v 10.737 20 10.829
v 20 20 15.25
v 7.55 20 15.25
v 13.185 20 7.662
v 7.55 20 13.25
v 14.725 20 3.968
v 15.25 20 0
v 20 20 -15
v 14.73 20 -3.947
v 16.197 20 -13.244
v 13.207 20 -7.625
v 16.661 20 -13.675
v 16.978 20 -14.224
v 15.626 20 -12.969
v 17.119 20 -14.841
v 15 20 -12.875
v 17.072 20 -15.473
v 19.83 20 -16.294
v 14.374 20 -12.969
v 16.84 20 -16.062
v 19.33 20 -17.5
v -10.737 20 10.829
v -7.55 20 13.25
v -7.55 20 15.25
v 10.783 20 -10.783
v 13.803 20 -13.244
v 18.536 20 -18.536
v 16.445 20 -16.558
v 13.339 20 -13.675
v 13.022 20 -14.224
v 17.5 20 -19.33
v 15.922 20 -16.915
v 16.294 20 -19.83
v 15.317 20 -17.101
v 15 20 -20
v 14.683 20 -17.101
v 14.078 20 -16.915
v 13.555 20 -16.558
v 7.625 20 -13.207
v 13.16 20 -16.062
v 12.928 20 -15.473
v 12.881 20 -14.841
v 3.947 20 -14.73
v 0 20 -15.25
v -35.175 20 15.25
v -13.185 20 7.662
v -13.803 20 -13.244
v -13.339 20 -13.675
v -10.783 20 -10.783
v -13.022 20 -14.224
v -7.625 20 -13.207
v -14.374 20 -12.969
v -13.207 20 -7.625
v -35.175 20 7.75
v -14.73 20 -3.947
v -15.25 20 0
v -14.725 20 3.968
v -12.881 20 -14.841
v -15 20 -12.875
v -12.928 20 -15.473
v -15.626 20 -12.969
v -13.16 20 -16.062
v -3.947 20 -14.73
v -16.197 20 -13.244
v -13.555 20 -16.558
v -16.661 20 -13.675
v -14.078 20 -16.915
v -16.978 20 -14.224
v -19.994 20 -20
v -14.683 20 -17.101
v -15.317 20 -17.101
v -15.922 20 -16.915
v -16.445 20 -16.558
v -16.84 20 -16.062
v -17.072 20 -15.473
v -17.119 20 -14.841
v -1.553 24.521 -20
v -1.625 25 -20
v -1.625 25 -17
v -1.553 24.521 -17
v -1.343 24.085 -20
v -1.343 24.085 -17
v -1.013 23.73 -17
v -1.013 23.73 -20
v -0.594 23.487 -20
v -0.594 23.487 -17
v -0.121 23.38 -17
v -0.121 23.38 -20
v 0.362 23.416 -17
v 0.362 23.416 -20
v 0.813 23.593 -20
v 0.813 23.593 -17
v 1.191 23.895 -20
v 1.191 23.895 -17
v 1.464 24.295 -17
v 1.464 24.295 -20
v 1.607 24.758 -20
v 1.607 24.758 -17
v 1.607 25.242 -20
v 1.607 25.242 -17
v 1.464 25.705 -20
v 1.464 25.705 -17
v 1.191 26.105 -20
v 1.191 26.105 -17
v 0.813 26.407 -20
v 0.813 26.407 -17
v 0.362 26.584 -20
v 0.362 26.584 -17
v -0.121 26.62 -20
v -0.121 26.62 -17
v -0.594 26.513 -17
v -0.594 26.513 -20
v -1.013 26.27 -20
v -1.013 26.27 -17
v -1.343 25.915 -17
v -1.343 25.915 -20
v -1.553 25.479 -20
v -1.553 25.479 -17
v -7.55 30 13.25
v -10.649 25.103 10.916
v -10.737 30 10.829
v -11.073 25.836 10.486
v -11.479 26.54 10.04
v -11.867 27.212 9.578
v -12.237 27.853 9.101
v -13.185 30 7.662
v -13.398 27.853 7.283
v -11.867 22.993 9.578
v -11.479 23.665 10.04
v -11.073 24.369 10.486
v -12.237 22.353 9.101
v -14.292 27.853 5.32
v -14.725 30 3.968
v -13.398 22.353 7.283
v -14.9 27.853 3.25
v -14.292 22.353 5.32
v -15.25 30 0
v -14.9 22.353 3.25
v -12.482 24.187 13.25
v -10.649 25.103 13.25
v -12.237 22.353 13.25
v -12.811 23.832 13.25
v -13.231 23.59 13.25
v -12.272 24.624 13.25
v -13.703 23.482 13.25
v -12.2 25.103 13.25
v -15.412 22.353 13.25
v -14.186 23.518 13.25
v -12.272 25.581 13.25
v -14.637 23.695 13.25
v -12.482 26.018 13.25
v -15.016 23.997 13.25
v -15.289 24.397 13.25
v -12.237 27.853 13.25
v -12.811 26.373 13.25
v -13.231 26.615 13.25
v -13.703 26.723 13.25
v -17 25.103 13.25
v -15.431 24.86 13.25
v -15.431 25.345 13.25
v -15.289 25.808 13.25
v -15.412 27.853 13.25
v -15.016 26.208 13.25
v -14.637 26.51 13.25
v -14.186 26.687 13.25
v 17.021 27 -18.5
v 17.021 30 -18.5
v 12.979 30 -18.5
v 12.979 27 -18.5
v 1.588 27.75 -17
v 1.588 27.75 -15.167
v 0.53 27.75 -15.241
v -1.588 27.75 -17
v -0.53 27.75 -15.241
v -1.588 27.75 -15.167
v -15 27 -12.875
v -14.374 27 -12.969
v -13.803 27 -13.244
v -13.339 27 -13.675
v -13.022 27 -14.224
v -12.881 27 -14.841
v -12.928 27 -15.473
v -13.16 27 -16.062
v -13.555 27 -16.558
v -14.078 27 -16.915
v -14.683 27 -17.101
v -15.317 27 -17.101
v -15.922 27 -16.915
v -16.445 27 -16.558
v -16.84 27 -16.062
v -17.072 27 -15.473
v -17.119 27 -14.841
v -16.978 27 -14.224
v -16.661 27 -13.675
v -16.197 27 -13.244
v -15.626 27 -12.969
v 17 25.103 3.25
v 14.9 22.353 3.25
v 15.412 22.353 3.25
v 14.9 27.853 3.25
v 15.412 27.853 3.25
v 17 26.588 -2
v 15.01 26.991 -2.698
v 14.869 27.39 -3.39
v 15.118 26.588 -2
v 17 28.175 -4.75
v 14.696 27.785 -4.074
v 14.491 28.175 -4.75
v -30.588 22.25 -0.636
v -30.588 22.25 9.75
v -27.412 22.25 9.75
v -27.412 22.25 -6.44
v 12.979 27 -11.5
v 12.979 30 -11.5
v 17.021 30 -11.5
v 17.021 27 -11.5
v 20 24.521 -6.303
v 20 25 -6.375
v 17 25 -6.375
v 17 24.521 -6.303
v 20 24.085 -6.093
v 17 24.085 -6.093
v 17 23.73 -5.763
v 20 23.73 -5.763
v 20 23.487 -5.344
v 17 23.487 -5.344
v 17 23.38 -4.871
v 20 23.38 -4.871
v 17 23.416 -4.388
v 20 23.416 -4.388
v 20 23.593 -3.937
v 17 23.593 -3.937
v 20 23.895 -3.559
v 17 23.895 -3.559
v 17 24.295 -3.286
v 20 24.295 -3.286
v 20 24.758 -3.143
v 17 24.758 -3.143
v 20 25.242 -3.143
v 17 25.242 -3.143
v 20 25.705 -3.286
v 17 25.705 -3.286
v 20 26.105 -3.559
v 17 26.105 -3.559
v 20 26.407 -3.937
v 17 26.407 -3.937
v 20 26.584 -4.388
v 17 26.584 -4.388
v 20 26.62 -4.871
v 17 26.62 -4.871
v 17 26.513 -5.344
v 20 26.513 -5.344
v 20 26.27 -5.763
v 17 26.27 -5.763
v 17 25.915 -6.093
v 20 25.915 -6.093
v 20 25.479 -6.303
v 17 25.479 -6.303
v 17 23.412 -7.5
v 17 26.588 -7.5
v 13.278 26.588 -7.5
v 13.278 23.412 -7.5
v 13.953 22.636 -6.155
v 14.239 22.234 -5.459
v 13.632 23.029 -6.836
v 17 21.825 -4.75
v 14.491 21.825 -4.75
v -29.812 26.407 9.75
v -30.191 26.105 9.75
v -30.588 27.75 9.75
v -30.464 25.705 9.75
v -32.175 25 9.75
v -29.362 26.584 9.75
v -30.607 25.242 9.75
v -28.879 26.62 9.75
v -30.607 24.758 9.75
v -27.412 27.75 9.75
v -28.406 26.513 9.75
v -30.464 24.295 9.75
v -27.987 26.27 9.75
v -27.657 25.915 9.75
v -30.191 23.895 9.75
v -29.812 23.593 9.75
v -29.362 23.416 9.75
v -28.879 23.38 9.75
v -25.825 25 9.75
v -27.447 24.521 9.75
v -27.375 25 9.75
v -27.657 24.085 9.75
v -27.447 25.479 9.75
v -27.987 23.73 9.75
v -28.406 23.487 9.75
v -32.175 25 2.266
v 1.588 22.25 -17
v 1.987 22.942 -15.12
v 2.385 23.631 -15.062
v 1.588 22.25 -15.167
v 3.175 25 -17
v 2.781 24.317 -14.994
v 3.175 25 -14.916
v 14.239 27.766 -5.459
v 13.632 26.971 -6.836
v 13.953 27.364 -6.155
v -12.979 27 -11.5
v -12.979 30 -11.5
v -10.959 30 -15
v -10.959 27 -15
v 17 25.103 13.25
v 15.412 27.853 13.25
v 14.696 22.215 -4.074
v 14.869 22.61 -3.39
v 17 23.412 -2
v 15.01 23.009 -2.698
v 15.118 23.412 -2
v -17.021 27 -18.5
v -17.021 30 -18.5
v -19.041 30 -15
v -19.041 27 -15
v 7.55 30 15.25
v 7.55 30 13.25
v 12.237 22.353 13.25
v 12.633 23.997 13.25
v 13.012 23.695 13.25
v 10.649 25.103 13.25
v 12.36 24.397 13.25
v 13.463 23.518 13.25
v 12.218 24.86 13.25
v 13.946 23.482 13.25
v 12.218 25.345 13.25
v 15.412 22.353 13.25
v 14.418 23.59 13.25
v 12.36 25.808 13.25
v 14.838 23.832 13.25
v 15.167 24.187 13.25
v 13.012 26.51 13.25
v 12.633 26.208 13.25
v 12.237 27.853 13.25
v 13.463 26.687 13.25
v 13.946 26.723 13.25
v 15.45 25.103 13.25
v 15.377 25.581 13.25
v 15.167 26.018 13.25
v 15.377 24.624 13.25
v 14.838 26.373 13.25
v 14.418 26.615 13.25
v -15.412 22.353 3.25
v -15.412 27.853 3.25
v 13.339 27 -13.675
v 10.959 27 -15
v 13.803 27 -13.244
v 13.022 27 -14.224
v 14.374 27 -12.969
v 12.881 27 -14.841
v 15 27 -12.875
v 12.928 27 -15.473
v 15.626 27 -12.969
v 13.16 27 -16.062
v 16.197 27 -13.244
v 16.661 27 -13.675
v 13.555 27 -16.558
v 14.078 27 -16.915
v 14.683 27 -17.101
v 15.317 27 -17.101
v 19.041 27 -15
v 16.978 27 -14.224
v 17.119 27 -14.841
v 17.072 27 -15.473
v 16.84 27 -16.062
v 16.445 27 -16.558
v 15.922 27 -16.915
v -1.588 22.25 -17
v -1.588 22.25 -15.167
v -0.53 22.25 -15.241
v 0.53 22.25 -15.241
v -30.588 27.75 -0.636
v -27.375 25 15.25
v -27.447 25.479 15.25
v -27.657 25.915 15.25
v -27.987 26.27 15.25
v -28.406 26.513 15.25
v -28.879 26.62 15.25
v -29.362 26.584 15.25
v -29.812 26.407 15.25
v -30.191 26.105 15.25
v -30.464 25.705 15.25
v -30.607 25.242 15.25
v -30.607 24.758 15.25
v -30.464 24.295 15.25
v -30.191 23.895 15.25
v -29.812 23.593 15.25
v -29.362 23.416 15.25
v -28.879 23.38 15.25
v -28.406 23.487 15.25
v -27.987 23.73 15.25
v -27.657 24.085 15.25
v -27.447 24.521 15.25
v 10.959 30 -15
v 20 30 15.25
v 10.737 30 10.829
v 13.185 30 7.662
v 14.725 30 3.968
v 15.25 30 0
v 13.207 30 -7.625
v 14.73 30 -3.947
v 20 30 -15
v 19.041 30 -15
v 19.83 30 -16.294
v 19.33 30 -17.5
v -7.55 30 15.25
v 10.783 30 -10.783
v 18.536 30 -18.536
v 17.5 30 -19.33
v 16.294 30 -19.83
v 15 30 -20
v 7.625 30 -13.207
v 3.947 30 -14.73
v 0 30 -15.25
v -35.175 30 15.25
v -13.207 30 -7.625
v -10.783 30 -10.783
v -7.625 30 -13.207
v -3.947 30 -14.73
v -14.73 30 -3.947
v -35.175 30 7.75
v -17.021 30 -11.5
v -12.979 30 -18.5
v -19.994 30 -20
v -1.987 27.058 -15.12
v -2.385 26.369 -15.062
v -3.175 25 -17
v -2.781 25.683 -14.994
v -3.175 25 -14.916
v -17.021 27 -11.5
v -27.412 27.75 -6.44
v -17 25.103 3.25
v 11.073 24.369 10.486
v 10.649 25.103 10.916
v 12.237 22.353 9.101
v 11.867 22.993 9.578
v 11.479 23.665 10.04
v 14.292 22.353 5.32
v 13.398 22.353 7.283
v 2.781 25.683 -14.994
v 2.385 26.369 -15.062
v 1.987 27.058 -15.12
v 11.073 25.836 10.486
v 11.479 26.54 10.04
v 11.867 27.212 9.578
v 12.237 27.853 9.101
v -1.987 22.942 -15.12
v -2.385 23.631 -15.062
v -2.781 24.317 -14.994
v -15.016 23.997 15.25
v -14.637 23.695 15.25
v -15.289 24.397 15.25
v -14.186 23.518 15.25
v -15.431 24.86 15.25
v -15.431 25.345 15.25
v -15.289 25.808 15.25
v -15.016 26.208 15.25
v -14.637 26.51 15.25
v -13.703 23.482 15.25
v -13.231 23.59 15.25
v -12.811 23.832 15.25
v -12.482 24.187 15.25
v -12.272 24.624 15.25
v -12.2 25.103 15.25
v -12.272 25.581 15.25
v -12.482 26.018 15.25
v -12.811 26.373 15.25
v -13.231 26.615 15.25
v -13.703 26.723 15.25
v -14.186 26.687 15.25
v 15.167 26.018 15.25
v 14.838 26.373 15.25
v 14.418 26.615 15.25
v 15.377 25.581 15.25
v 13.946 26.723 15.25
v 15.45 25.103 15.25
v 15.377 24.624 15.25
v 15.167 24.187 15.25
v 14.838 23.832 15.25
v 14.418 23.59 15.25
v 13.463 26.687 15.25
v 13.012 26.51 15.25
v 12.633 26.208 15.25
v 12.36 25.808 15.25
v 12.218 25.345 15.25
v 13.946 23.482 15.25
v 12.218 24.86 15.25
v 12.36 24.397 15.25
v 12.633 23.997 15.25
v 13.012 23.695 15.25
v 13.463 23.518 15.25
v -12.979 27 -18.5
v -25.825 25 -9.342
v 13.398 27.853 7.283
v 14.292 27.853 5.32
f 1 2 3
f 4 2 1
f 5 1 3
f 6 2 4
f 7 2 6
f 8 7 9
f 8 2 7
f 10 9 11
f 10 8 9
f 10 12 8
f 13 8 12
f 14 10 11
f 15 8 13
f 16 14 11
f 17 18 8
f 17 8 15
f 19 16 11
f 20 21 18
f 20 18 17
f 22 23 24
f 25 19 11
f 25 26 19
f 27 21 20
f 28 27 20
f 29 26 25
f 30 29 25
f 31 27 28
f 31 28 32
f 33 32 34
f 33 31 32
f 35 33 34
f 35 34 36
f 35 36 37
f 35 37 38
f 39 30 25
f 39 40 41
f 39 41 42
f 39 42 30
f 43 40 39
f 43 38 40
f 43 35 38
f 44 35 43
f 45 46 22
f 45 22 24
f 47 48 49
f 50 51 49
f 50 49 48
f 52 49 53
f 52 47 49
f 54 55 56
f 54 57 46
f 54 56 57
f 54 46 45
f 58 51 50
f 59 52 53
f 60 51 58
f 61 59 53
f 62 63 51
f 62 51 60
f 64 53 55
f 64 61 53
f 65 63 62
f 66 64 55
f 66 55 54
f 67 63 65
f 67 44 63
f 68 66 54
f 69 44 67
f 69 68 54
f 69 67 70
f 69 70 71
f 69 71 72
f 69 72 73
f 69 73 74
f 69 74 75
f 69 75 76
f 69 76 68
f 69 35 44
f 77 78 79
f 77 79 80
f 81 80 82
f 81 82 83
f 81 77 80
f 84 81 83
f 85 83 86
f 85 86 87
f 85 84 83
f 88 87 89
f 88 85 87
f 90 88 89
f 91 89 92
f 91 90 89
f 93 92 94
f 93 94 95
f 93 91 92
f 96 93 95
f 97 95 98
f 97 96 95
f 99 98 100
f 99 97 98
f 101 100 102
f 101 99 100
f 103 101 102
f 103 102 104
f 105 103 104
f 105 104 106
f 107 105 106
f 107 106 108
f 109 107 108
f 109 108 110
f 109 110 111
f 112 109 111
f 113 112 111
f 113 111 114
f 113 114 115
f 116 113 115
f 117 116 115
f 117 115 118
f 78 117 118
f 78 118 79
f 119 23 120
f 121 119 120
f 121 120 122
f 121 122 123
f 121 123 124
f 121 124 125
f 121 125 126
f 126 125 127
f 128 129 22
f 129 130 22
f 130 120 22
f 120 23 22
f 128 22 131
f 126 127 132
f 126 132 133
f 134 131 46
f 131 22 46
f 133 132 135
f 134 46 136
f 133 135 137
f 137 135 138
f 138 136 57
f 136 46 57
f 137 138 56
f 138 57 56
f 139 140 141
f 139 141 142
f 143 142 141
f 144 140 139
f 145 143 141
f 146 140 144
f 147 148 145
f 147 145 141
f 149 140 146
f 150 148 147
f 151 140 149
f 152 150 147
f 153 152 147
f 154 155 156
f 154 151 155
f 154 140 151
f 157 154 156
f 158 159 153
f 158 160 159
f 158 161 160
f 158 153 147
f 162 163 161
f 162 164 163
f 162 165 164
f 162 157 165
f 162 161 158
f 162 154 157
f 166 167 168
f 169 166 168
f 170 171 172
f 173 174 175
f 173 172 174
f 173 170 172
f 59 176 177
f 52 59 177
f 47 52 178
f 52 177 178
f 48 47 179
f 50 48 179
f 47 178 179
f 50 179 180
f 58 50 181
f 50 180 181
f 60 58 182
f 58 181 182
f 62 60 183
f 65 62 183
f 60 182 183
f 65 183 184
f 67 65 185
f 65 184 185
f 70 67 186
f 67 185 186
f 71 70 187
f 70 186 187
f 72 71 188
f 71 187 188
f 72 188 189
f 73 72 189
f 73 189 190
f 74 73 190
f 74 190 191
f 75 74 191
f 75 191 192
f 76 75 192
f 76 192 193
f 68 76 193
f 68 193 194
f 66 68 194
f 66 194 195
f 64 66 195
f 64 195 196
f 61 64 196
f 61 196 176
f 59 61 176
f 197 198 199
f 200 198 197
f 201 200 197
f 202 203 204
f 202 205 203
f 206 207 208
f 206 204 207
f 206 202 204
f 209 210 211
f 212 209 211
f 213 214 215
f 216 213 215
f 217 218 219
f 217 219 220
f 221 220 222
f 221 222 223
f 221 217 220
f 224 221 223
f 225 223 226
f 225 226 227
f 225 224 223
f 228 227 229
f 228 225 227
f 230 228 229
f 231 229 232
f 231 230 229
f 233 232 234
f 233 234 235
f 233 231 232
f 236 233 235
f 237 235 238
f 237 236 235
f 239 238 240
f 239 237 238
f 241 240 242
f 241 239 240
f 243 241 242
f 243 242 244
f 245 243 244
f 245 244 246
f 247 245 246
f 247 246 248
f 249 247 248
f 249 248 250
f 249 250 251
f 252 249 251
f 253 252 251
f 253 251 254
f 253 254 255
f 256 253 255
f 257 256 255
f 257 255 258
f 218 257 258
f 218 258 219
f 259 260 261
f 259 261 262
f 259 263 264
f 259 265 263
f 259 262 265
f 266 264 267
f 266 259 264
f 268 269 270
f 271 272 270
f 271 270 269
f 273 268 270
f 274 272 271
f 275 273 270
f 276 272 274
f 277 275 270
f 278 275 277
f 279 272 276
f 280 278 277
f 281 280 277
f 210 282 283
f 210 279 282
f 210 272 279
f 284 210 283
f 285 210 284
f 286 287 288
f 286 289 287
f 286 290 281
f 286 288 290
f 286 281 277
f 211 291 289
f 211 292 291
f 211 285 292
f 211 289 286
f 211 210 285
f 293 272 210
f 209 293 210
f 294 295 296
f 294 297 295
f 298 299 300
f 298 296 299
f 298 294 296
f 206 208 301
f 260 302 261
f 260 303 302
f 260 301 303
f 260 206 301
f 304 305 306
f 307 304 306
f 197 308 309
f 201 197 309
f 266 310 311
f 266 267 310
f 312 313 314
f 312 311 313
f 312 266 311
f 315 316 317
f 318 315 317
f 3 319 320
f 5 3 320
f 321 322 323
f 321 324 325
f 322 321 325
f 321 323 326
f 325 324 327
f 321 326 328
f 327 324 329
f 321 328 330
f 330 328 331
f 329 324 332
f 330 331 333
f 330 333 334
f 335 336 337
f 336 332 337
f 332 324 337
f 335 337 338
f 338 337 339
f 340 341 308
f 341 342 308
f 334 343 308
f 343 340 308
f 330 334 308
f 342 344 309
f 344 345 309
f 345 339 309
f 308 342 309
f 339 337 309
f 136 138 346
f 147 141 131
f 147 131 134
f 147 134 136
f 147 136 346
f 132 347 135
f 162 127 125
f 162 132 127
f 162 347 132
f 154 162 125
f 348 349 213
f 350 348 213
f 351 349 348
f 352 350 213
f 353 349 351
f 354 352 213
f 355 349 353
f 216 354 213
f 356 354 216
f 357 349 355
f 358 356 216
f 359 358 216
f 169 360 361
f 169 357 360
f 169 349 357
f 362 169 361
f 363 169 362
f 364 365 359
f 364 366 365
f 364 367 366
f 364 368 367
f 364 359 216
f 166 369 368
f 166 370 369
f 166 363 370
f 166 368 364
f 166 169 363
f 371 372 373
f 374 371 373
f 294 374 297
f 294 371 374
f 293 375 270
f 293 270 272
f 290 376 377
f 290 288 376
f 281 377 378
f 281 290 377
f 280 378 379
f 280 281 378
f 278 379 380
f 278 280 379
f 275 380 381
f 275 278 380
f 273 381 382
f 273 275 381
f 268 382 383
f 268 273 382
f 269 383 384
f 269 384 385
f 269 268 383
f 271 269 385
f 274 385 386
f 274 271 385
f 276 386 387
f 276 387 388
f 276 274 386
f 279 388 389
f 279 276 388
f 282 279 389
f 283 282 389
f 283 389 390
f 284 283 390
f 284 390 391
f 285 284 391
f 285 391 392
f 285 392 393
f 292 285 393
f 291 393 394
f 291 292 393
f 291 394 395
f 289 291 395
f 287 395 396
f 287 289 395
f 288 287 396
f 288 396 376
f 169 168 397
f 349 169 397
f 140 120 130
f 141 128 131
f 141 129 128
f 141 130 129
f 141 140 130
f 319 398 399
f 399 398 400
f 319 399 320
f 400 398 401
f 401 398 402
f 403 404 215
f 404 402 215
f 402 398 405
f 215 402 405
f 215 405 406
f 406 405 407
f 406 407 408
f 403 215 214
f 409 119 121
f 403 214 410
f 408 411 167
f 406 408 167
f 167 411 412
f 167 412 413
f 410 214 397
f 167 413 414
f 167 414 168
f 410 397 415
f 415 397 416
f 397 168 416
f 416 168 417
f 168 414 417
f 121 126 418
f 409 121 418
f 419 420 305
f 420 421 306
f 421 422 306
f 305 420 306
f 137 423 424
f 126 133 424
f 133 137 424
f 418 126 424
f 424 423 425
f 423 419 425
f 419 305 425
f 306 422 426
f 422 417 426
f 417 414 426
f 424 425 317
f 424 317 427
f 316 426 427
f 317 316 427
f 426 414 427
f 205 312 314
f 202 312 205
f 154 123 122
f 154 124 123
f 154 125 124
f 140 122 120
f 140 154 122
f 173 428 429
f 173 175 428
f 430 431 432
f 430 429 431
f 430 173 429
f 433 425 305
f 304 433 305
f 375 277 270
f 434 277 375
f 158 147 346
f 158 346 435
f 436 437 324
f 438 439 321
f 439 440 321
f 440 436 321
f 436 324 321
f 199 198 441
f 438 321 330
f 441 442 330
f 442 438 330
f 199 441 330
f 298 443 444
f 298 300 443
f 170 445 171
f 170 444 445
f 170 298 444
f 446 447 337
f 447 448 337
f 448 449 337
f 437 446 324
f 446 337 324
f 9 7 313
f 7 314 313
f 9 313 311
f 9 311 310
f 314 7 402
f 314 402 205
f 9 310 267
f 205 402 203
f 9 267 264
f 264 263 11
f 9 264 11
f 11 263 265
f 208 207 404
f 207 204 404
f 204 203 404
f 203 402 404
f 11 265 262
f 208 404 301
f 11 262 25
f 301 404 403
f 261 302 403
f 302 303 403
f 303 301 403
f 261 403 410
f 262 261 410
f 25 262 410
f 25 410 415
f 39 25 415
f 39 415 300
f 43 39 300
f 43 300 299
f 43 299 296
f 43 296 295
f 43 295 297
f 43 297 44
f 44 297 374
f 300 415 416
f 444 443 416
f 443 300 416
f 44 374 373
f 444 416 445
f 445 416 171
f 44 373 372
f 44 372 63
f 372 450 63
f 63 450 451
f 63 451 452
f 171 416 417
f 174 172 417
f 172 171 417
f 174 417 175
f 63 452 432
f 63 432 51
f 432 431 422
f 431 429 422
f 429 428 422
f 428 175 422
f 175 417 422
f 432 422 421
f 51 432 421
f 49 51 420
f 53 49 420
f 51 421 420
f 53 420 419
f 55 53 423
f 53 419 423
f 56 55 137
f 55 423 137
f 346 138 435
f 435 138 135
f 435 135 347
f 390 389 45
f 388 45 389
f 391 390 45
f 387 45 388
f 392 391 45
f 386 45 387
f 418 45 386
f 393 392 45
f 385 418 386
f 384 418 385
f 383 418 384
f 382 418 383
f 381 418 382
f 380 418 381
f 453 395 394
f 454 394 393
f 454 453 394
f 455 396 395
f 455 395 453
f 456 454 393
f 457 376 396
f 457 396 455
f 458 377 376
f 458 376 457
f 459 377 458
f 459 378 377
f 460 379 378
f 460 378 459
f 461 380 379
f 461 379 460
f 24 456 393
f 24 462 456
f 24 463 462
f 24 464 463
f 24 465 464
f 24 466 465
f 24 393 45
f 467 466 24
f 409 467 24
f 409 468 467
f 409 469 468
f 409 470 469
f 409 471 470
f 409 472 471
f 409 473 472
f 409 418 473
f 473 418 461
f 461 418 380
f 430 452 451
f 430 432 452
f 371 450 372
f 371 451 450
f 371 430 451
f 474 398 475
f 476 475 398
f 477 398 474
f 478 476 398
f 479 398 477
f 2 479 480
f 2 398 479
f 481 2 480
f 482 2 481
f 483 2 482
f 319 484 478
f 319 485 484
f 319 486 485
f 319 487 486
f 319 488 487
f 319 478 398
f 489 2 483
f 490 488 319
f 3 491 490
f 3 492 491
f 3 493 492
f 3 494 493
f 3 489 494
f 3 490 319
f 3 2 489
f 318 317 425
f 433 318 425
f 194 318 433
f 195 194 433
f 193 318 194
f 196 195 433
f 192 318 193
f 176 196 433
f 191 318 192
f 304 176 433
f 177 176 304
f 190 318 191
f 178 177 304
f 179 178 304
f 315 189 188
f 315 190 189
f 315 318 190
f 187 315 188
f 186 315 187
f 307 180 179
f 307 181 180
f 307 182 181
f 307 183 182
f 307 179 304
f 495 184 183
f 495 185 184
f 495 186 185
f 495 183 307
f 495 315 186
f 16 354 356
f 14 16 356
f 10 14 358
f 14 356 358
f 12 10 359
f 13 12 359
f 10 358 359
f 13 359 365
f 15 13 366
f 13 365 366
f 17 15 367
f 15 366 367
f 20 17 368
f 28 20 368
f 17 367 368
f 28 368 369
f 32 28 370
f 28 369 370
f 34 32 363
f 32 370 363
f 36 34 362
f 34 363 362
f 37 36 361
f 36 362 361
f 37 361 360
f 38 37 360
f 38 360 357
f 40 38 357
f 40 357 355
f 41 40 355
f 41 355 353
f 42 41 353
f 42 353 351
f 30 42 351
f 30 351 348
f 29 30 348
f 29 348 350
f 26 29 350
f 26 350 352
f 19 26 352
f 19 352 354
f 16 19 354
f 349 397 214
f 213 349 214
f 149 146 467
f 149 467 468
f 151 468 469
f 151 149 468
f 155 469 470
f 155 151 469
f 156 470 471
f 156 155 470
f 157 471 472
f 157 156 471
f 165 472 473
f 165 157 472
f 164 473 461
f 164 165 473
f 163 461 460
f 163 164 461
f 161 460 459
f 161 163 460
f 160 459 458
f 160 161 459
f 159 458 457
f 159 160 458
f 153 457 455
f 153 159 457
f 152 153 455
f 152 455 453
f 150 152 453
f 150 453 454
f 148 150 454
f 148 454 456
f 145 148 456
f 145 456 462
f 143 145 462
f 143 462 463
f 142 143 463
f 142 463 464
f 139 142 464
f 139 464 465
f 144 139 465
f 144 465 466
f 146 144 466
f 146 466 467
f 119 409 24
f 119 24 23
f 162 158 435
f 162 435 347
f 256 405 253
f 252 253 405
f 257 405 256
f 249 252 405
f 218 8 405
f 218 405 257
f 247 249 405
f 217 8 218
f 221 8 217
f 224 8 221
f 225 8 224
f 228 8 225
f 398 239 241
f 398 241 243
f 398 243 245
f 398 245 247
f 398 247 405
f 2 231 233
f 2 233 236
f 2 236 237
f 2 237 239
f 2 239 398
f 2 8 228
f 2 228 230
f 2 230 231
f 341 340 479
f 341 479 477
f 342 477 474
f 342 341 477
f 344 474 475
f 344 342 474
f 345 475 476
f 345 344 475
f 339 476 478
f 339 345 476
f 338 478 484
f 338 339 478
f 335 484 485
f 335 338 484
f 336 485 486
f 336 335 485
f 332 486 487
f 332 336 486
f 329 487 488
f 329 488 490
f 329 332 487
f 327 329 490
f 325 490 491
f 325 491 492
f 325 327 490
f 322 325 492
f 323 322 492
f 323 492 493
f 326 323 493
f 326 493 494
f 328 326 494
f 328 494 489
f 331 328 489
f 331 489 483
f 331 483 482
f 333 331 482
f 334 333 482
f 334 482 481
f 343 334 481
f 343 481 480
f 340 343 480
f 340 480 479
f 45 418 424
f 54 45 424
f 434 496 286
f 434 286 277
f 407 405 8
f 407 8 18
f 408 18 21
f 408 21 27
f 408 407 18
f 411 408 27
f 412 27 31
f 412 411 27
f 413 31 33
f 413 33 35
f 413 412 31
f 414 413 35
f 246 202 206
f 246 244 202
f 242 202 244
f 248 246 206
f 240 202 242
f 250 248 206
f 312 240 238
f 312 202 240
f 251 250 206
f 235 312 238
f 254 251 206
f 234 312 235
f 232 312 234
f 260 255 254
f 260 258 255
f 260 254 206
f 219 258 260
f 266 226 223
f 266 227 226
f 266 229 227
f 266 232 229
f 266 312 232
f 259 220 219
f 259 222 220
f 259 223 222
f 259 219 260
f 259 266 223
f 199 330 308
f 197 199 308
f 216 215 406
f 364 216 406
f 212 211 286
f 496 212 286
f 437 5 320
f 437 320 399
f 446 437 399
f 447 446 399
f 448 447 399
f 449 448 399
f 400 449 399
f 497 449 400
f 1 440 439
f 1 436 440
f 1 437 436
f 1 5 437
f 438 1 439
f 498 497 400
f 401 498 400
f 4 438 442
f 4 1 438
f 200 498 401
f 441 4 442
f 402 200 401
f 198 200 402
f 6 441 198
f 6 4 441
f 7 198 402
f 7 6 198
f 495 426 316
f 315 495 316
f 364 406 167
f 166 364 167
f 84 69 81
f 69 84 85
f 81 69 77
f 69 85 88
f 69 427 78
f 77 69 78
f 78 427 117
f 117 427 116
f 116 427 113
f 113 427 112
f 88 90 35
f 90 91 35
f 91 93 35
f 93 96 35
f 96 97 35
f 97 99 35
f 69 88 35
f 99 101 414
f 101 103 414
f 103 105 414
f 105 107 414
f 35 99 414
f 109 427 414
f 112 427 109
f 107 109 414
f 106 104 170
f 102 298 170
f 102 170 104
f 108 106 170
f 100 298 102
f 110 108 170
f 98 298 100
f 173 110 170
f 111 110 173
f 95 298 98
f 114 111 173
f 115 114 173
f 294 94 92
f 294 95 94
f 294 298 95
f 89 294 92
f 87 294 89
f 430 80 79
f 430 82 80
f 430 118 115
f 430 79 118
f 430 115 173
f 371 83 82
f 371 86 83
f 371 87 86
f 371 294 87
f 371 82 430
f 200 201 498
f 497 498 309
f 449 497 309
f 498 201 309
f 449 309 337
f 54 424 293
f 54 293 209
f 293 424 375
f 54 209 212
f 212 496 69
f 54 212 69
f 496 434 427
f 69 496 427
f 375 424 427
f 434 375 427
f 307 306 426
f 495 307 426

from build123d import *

# Parameters (mm, degrees)
CROQUIS1_R                              = 15.25
CROQUIS1_R_2                            = 2.125
SOPORTE_CAJA_REDUCTORA_DEPTH            = 20
CROQUIS3_R                              = 2.125
CORTAR_EXTRUIR1_DEPTH                   = 51.423828692
REDONDEO1_R                             = 5
BOSS_EXTRUDE1_DEPTH                     = 20
CUT_EXTRUDE1_REACH                      = 55.852
SKETCH2_R                               = 1.625
CUT_EXTRUDE2_DEPTH                      = 2
SKETCH4_R                               = 1.625
CUT_EXTRUDE3_DEPTH                      = 63.291652731
CUT_EXTRUDE4_START                      = -4.5
CUT_EXTRUDE4_DEPTH                      = 2
CROQUIS6_W                              = 4.75
CROQUIS6_H                              = 4.75
CORTAR_EXTRUIR17_DEPTH                  = 42.231056256
CROQUIS7_W                              = 60
CROQUIS7_H                              = 20
CORTAR_EXTRUIR18_DEPTH                  = 51.423828692
SALIENTE_EXTRUIR2_DEPTH                 = 49
SOPORTE_START                           = -15
SOPORTE_MOTOR_DEPTH                     = 15
CROQUIS12_R                             = 2.125
AGUJEROS_DE_SUJECION_A_BASE_DEPTH       = 84.087679592
TUERCA_START                            = -4
TUERCA_AGUJERO_DE_SUJECION_A_BASE_DEPTH = 10
SALIENTE_EXTRUIR4_DEPTH                 = 15
CORTAR_EXTRUIR19_DEPTH                  = 25
CROQUIS14_W                             = 50
CROQUIS14_H                             = 118
CORTAR_EXTRUIR22_DEPTH                  = 146.556045907
CROQUIS15_W                             = 10
CROQUIS15_H                             = 7
CORTAR_EXTRUIR23_DEPTH                  = 42.231056256
CORTAR_EXTRUIR24_DEPTH                  = 42.231056256
CROQUIS18_W                             = 40
CROQUIS18_H                             = 10
CORTAR_EXTRUIR25_DEPTH                  = 44.27311521
SALIENTE_EXTRUIR5_DEPTH                 = 10
CROQUIS20_R                             = 1
CORTAR_EXTRUIR26_DEPTH                  = 49.229270158
CORTAR_EXTRUIR27_REACH                  = 62.959
CORTAR_EXTRUIR27_END_RADIUS             = 15.25
CROQUIS21_R                             = 1.625
CROQUIS22_R                             = 2.125
CROQUIS22_R_2                           = 1
SALIENTE_EXTRUIR6_DEPTH                 = 10
CROQUIS23_R                             = 1.625
CORTAR_EXTRUIR28_DEPTH                  = 52.269508521
CORTAR_EXTRUIR29_START                  = -3
CORTAR_EXTRUIR29_DEPTH                  = 10
SALIENTE_EXTRUIR7_DEPTH                 = 10
CORTAR_EXTRUIR30_REACH                  = 72.235
CROQUIS27_R                             = 1.625
CORTAR_EXTRUIR31_REACH                  = 75.235
CORTAR_EXTRUIR31_START                  = -3
CORTAR_EXTRUIR32_REACH                  = 58.612
CROQUIS29_R                             = 1.625
CORTAR_EXTRUIR33_REACH                  = 61.112
CORTAR_EXTRUIR33_START                  = -2.5
CROQUIS35_W                             = 13.305418987
CROQUIS35_H                             = 6.826864192
CORTAR_EXTRUIR34_DEPTH                  = 63.931555098
CORTAR_EXTRUIR34_DEPTH_BACK             = 63.931555098
CORTAR_EXTRUIR35_START                  = -3
CORTAR_EXTRUIR35_DEPTH                  = 10
SALIENTE_EXTRUIR8_DEPTH                 = 10
SALIENTE_EXTRUIR9_DEPTH                 = 13
SALIENTE_EXTRUIR10_DEPTH                = 3
CROQUIS40_W                             = 106.583537839
CROQUIS40_H                             = 47.391515964
CORTAR_EXTRUIR36_DEPTH                  = 80.887064817
CORTAR_EXTRUIR36_DEPTH_BACK             = 80.887064817
CORTAR_EXTRUIR37_DEPTH                  = 67.2524009
CORTAR_EXTRUIR37_DEPTH_BACK             = 67.2524009
CORTAR_EXTRUIR38_DEPTH                  = 79.704784639
CORTAR_EXTRUIR38_DEPTH_BACK             = 79.704784639
SALIENTE_EXTRUIR11_DEPTH                = 10
CORTAR_EXTRUIR39_DEPTH                  = 63.9908649
CROQUIS45_W                             = 31.470301378
CROQUIS45_H                             = 10
CROQUIS45_R                             = 1.625
SALIENTE_EXTRUIR12_DEPTH                = 2.5
SALIENTE_EXTRUIR13_DEPTH                = 10
CORTAR_EXTRUIR40_START                  = -2
CROQUIS47_R                             = 1.625
CORTAR_EXTRUIR40_DEPTH                  = 10
CORTAR_EXTRUIR41_START                  = -12
CROQUIS48_R                             = 1.625
CORTAR_EXTRUIR41_DEPTH                  = 12
CORTAR_EXTRUIR42_DEPTH                  = 3
CROQUIS50_R                             = 2.125
CORTAR_EXTRUIR43_DEPTH                  = 52.795622989
CORTAR_EXTRUIR43_DEPTH_BACK             = 52.795622989
CORTAR_EXTRUIR44_DEPTH                  = 52.795622989
CORTAR_EXTRUIR44_DEPTH_BACK             = 52.795622989
SALIENTE_EXTRUIR14_DEPTH                = 10
CORTAR_EXTRUIR45_START                  = -24.591895
CORTAR_EXTRUIR45_DEPTH                  = 17.091895


with BuildPart() as part:
    # Croquis1 → Soporte caja reductora (new body)
    with BuildSketch(Plane(origin=(0, 0, 0), x_dir=(1, 0, 0), z_dir=(0, 1, 0))):
        Polygon((-30, -15.25), (-20, -15.25), (-20, -20), (20, -20), (20, -15.25), (30, -15.25), (30, -7.25), (20, -4.25), (20, 20), (-20, 20), (-20, -4.25), (-30, -7.25), align=None)
        with Locations(Location((0, 0, 0), (0, 0, 270))):
            Circle(CROQUIS1_R, mode=Mode.SUBTRACT)
        with Locations(Location((-15, 15, 0), (0, 0, 270))):
            Circle(CROQUIS1_R_2, mode=Mode.SUBTRACT)
        with Locations(Location((15, 15, 0), (0, 0, 270))):
            Circle(CROQUIS1_R_2, mode=Mode.SUBTRACT)
    extrude(amount=-SOPORTE_CAJA_REDUCTORA_DEPTH)

    # Croquis3 → Cortar-Extruir1 (cut, through all)
    with BuildSketch(Plane.XY.offset(15.25)):
        with Locations((-23.5, -10)):
            Circle(CROQUIS3_R)
        with Locations((23.5, -10)):
            Circle(CROQUIS3_R)
    extrude(amount=-CORTAR_EXTRUIR1_DEPTH, mode=Mode.SUBTRACT)

    # Redondeo1
    redondeo1_edges = [part.edges().sort_by_distance(p)[0] for p in [
        (-20, -10, -20),
        (20, -10, -20),
    ]]
    fillet(redondeo1_edges, radius=REDONDEO1_R)

    # Sketch1 → Boss-Extrude1 (add)
    with BuildSketch(Plane(origin=(0, 0, 0), x_dir=(1, 0, 0), z_dir=(0, 1, 0))):
        with BuildLine():
            Line((25.5, 15), (20, 15))
            ThreePointArc((20, 15), (18.535533906, 18.535533906), (15, 20))
            Line((15, 20), (30, 20))
            Line((30, 20), (30, 8))
            Line((30, 8), (25.5, 8))
            Line((25.5, 8), (25.5, 15))
        make_face()
    extrude(amount=-BOSS_EXTRUDE1_DEPTH)

    # Sketch2 → Cut-Extrude1 (cut, up to next)
    with BuildSketch(Plane(origin=(0, 0, -20), x_dir=(-1, 0, 0), z_dir=(0, 0, -1)), mode=Mode.PRIVATE) as cut_extrude1_sk1:
        with Locations((-22.75, -10)):
            Circle(SKETCH2_R)
    cut_extrude1_tool1 = extrude(cut_extrude1_sk1.sketch, amount=-CUT_EXTRUDE1_REACH, mode=Mode.PRIVATE) & part.part
    add(cut_extrude1_tool1.solids().sort_by_distance((22.75, -10, -20))[0], mode=Mode.SUBTRACT)

    # Sketch3 → Cut-Extrude2 (cut)
    with BuildSketch(Plane.XY.offset(-15)):
        Polygon((20, -11.58771324), (22.75, -13.175426481), (25.5, -11.58771324), (25.5, -8.41228676), (22.75, -6.824573519), (20, -8.41228676), align=None)
    extrude(amount=-CUT_EXTRUDE2_DEPTH, mode=Mode.SUBTRACT)

    # Sketch4 → Cut-Extrude3 (cut, through all)
    with BuildSketch(Plane.ZY.offset(-25.5)):
        with Locations((-12.25, -10)):
            Circle(SKETCH4_R)
    extrude(amount=-CUT_EXTRUDE3_DEPTH, mode=Mode.SUBTRACT)

    # Sketch5 → Cut-Extrude4 (cut)
    with BuildSketch(Plane(origin=(30, 0, 0), x_dir=(0, 0, -1), z_dir=(1, 0, 0)).offset(CUT_EXTRUDE4_START)):
        Polygon((15, -11.58771324), (15, -8.41228676), (12.25, -6.824573519), (9.5, -8.41228676), (9.5, -11.58771324), (12.25, -13.175426481), align=None)
    extrude(amount=CUT_EXTRUDE4_DEPTH, mode=Mode.SUBTRACT)

    # Croquis6 → Cortar-Extruir17 (cut, through all)
    with BuildSketch(Plane(origin=(0, 0, 0), x_dir=(1, 0, 0), z_dir=(0, 1, 0))):
        Polygon((0, -15.25), (-15.25, -15.25), (-15.25, -20), (15.25, -20), (15.25, -15.25), align=None)
        with Locations((-17.625, -17.625)):
            Rectangle(CROQUIS6_W, CROQUIS6_H)
        with BuildLine():
            ThreePointArc((0, -15.25), (-10.783378413, -10.783378413), (-15.25, 0))
            Line((-15.25, 0), (-15.25, -15.25))
            Line((-15.25, -15.25), (0, -15.25))
        make_face()
        with BuildLine():
            Line((15.25, -15.25), (15.25, 0))
            ThreePointArc((15.25, 0), (10.783378413, -10.783378413), (0, -15.25))
            Line((0, -15.25), (15.25, -15.25))
        make_face()
        with Locations((17.625, -17.625)):
            Rectangle(CROQUIS6_W, CROQUIS6_H)
    extrude(amount=-CORTAR_EXTRUIR17_DEPTH, mode=Mode.SUBTRACT)


with BuildPart() as body_2:
    # Simetría1: mirrored copy
    add(part.part.mirror(Plane.ZX))

    # Croquis8 → Saliente-Extruir2 (add)
    with BuildSketch(Plane(origin=(0, 20, 0), x_dir=(1, 0, 0), z_dir=(0, 1, 0))):
        with BuildLine():
            Line((-12.664515522, 20), (-11.040489496, 13.939052358))
            Line((-11.040489496, 13.939052358), (-10.315162126, 11.232093763))
            ThreePointArc((-10.315162126, 11.232093763), (0, 15.25), (10.315162126, 11.232093763))
            Line((10.315162126, 11.232093763), (10.817418481, 13.87928066))
            Line((10.817418481, 13.87928066), (11.978715476, 20))
            Line((11.978715476, 20), (-12.664515522, 20))
        make_face()
    extrude(amount=SALIENTE_EXTRUIR2_DEPTH)

    # Croquis9 → Soporte motor (add)
    with BuildSketch(Plane(origin=(0, 69, 0), x_dir=(1, 0, 0), z_dir=(0, 1, 0)).offset(SOPORTE_START)):
        with BuildLine():
            Line((-20, 15), (-20, -4.25))
            Line((-20, -4.25), (-30, -7.25))
            Line((-30, -7.25), (-30, -15.25))
            Line((-30, -15.25), (0, -15.25))
            Line((0, -15.25), (0, -14.75))
            ThreePointArc((0, -14.75), (-10.429825023, 10.429825023), (14.75, 0))
            Line((14.75, 0), (20, 0))
            Line((20, 0), (20, 13.936837101))
            Line((20, 13.936837101), (12.664515522, 20))
            Line((12.664515522, 20), (-15, 20))
            ThreePointArc((-15, 20), (-18.535533906, 18.535533906), (-20, 15))
        make_face()
    extrude(amount=-SOPORTE_MOTOR_DEPTH)

    # Croquis12 → Agujeros de sujecion a base (cut, through all)
    with BuildSketch(Plane.XY.offset(15.25)):
        with Locations((-23.5, 46.5)):
            Circle(CROQUIS12_R)
    extrude(amount=-AGUJEROS_DE_SUJECION_A_BASE_DEPTH, mode=Mode.SUBTRACT)

    # Croquis13 → Tuerca Agujero de sujecion a base (cut)
    with BuildSketch(Plane.XY.offset(15.25).offset(TUERCA_START)):
        Polygon((-20, 44.479274058), (-20, 48.520725942), (-23.5, 50.541451884), (-27, 48.520725942), (-27, 44.479274058), (-23.5, 42.458548116), align=None)
    extrude(amount=-TUERCA_AGUJERO_DE_SUJECION_A_BASE_DEPTH, mode=Mode.SUBTRACT)

    # Croquis10 → Saliente-Extruir4 (add)
    with BuildSketch(Plane(origin=(0, 69, 0), x_dir=(1, 0, 0), z_dir=(0, 1, 0))):
        with BuildLine():
            ThreePointArc((10.315162126, 11.232093763), (0, 15.25), (-10.315162126, 11.232093763))
            Line((-10.315162126, 11.232093763), (-10.16850369, 10.684757026))
            ThreePointArc((-10.16850369, 10.684757026), (0, 14.75), (10.16850369, 10.684757026))
            Line((10.16850369, 10.684757026), (10.315162126, 11.232093763))
        make_face()
    extrude(amount=-SALIENTE_EXTRUIR4_DEPTH)

    # Croquis11 → Cortar-Extruir19 (cut)
    with BuildSketch(Plane.XZ):
        with BuildLine():
            Line((15.25, 4.25), (20, 4.25))
            Line((20, 4.25), (21.972856468, 4.84185694))
            ThreePointArc((21.972856468, 4.84185694), (19.948931102, 10.40625523), (16.543503257, 15.25))
            Line((16.543503257, 15.25), (15.25, 15.25))
            Line((15.25, 15.25), (15.25, 4.25))
        make_face()
        with BuildLine():
            Line((21.972856468, 4.84185694), (30, 7.25))
            Line((30, 7.25), (30, 15.25))
            Line((30, 15.25), (16.543503257, 15.25))
            ThreePointArc((16.543503257, 15.25), (19.948931102, 10.40625523), (21.972856468, 4.84185694))
        make_face()
        with BuildLine():
            ThreePointArc((20, -15), (18.535533906, -18.535533906), (15, -20))
            Line((15, -20), (30, -20))
            Line((30, -20), (30, -8))
            Line((30, -8), (25.5, -8))
            Line((25.5, -8), (25.5, -15))
            Line((25.5, -15), (20, -15))
        make_face()
    extrude(amount=-CORTAR_EXTRUIR19_DEPTH, mode=Mode.SUBTRACT)

    # Simetría2: body 2 across face


with BuildPart() as part_1:
    add(part.part)

    # Croquis7 → Cortar-Extruir18 (cut, through all)
    with BuildSketch(Plane(origin=(0, 0, -20), x_dir=(-1, 0, 0), z_dir=(0, 0, -1))):
        with Locations((0, -10)):
            Rectangle(CROQUIS7_W, CROQUIS7_H)
    extrude(amount=-CORTAR_EXTRUIR18_DEPTH, mode=Mode.SUBTRACT)


with BuildPart() as body_2_1:
    add(body_2.part)
    add(body_2.part.mirror(Plane(origin=(-0.229209569, 69, -16.663998028), x_dir=(0, 0, 1), z_dir=(0, 1, 0))))

    # Croquis14 → Cortar-Extruir22 (cut, through all)
    with BuildSketch(Plane.XY.offset(15.25)):
        with Locations((-5, 79)):
            Rectangle(CROQUIS14_W, CROQUIS14_H)
    extrude(amount=-CORTAR_EXTRUIR22_DEPTH, mode=Mode.SUBTRACT)

    # Croquis15 → Cortar-Extruir23 (cut, through all)
    with BuildSketch(Plane.XZ):
        with Locations((-25, 7.75)):
            Rectangle(CROQUIS15_W, CROQUIS15_H)
    extrude(amount=-CORTAR_EXTRUIR23_DEPTH, mode=Mode.SUBTRACT)

    # Croquis16 → Cortar-Extruir24 (cut, through all)
    with BuildSketch(Plane.XZ):
        Polygon((-30, 15.25), (-15.25, 15.25), (-15.25, 12.75), (-20, 12.75), (-20, 11.25), (-30, 11.25), (-30, 12.75), align=None)
    extrude(amount=-CORTAR_EXTRUIR24_DEPTH, mode=Mode.SUBTRACT)

    # Croquis18 → Cortar-Extruir25 (cut, through all)
    with BuildSketch(Plane(origin=(0, 0, -20), x_dir=(-1, 0, 0), z_dir=(0, 0, -1))):
        with Locations((0, 5)):
            Rectangle(CROQUIS18_W, CROQUIS18_H)
    extrude(amount=-CORTAR_EXTRUIR25_DEPTH, mode=Mode.SUBTRACT)

    # Croquis19 → Saliente-Extruir5 (add)
    with BuildSketch(Plane(origin=(0, 20, 0), x_dir=(1, 0, 0), z_dir=(0, 1, 0))):
        Polygon((-20, -12.75), (-34, -12.75), (-34, -7.75), (-24, -7.75), (-20, -3.75), align=None)
    extrude(amount=-SALIENTE_EXTRUIR5_DEPTH)

    # Croquis20 → Cortar-Extruir26 (cut, through all)
    with BuildSketch(Plane(origin=(0, 0, 7.75), x_dir=(-1, 0, 0), z_dir=(0, 0, -1))):
        with Locations((29, 15)):
            Circle(CROQUIS20_R)
    extrude(amount=-CORTAR_EXTRUIR26_DEPTH, mode=Mode.SUBTRACT)

    # Cortar-Extruir27: up to this cylinder (the profile starts outside it)
    cortar_extruir27_end = Plane(origin=(0, 15, 0), z_dir=(0, -1, 0)) * Cylinder(CORTAR_EXTRUIR27_END_RADIUS, 157.418, mode=Mode.PRIVATE)
    # Croquis21 → Cortar-Extruir27 (cut, up to the surface)
    with BuildSketch(Plane(origin=(20, 0, 0), x_dir=(0, 0, -1), z_dir=(1, 0, 0)), mode=Mode.PRIVATE) as cortar_extruir27_sk1:
        with Locations((4.75, 15)):
            Circle(CROQUIS21_R)
    cortar_extruir27_tool1 = extrude(cortar_extruir27_sk1.sketch, amount=-CORTAR_EXTRUIR27_REACH, mode=Mode.PRIVATE) - cortar_extruir27_end
    add(cortar_extruir27_tool1.solids().sort_by_distance((20, 15, -4.75))[0], mode=Mode.SUBTRACT)

    # Croquis22 → Saliente-Extruir6 (add)
    with BuildSketch(Plane.XZ.offset(-10)):
        with Locations((-15, -15)):
            Circle(CROQUIS22_R)
        with Locations(Location((-15, -15, 0), (0, 0, 270))):
            Circle(CROQUIS22_R_2, mode=Mode.SUBTRACT)
        with Locations((15, -15)):
            Circle(CROQUIS22_R)
        with Locations(Location((15, -15, 0), (0, 0, 270))):
            Circle(CROQUIS22_R_2, mode=Mode.SUBTRACT)
    extrude(amount=-SALIENTE_EXTRUIR6_DEPTH)

    # Croquis23 → Cortar-Extruir28 (cut, through all)
    with BuildSketch(Plane(origin=(0, 0, -20), x_dir=(-1, 0, 0), z_dir=(0, 0, -1))):
        with Locations((0, 15)):
            Circle(CROQUIS23_R)
    extrude(amount=-CORTAR_EXTRUIR28_DEPTH, mode=Mode.SUBTRACT)

    # Croquis24 → Cortar-Extruir29 (cut)
    with BuildSketch(Plane(origin=(0, 0, -20), x_dir=(-1, 0, 0), z_dir=(0, 0, -1)).offset(CORTAR_EXTRUIR29_START)):
        Polygon((1.58771324, 12.25), (3.175426481, 15), (1.58771324, 17.75), (-1.58771324, 17.75), (-3.175426481, 15), (-1.58771324, 12.25), align=None)
    extrude(amount=-CORTAR_EXTRUIR29_DEPTH, mode=Mode.SUBTRACT)

    # Croquis26 → Saliente-Extruir7 (add)
    with BuildSketch(Plane.XZ.offset(-10)):
        Polygon((-34, 7.75), (-34, 12.75), (-58.825, 12.75), (-39.160527763, -4.104491148), (-20, -4.104491148), (-20, -0.104491148), (-35.732113118, -0.104491148), (-29, 7.75), align=None)
        Polygon((-34.268209086, 7.75), (-39.594516123, 1.535690951), (-46.844874897, 7.75), align=None, mode=Mode.SUBTRACT)
    extrude(amount=-SALIENTE_EXTRUIR7_DEPTH)

    # Croquis27 → Cortar-Extruir30 (cut, up to next)
    with BuildSketch(Plane.XY.offset(12.75), mode=Mode.PRIVATE) as cortar_extruir30_sk1:
        with Locations((-40.544874897, 15)):
            Circle(CROQUIS27_R)
    cortar_extruir30_tool1 = extrude(cortar_extruir30_sk1.sketch, amount=-CORTAR_EXTRUIR30_REACH, mode=Mode.PRIVATE) & body_2_1.part
    # Croquis27 → Cortar-Extruir30 (cut, up to next)
    with BuildSketch(Plane.XY.offset(12.75), mode=Mode.PRIVATE) as cortar_extruir30_sk2:
        with Locations((-29, 15)):
            Circle(CROQUIS27_R)
    cortar_extruir30_tool2 = extrude(cortar_extruir30_sk2.sketch, amount=-CORTAR_EXTRUIR30_REACH, mode=Mode.PRIVATE) & body_2_1.part
    add(cortar_extruir30_tool1.solids().sort_by_distance((-40.544875, 15, 12.75))[0], mode=Mode.SUBTRACT)
    add(cortar_extruir30_tool2.solids().sort_by_distance((-29, 15, 12.75))[0], mode=Mode.SUBTRACT)

    # Croquis28 → Cortar-Extruir31 (cut, up to next)
    with BuildSketch(Plane.XY.offset(12.75).offset(CORTAR_EXTRUIR31_START), mode=Mode.PRIVATE) as cortar_extruir31_sk1:
        Polygon((-38.957161657, 12.25), (-37.369448416, 15), (-38.957161657, 17.75), (-42.132588137, 17.75), (-43.720301378, 15), (-42.132588137, 12.25), align=None)
    cortar_extruir31_tool1 = extrude(cortar_extruir31_sk1.sketch, amount=-CORTAR_EXTRUIR31_REACH, mode=Mode.PRIVATE) & body_2_1.part
    # Croquis28 → Cortar-Extruir31 (cut, up to next)
    with BuildSketch(Plane.XY.offset(12.75).offset(CORTAR_EXTRUIR31_START), mode=Mode.PRIVATE) as cortar_extruir31_sk2:
        Polygon((-27.41228676, 12.25), (-25.824573519, 15), (-27.41228676, 17.75), (-30.58771324, 17.75), (-32.175426481, 15), (-30.58771324, 12.25), align=None)
    cortar_extruir31_tool2 = extrude(cortar_extruir31_sk2.sketch, amount=-CORTAR_EXTRUIR31_REACH, mode=Mode.PRIVATE) & body_2_1.part
    add(cortar_extruir31_tool1.solids().sort_by_distance((-40.544875, 15, 9.75))[0], mode=Mode.SUBTRACT)
    add(cortar_extruir31_tool2.solids().sort_by_distance((-29, 15, 9.75))[0], mode=Mode.SUBTRACT)

    # Croquis29 → Cortar-Extruir32 (cut, up to next)
    with BuildSketch(Plane(origin=(-18.612848159, 0, -21.715982563), x_dir=(-0.7592713073348843, 0, 0.6507742172658468), z_dir=(-0.6507742172658468, 0, -0.7592713073348843)), mode=Mode.PRIVATE) as cortar_extruir32_sk1:
        with Locations((33.812368097, 15)):
            Circle(CROQUIS29_R)
    cortar_extruir32_tool1 = extrude(cortar_extruir32_sk1.sketch, amount=-CORTAR_EXTRUIR32_REACH, mode=Mode.PRIVATE) & body_2_1.part
    add(cortar_extruir32_tool1.solids().sort_by_distance((-44.285609, 15, 0.288235))[0], mode=Mode.SUBTRACT)

    # Croquis31 → Cortar-Extruir33 (cut, up to next)
    with BuildSketch(Plane(origin=(-18.612848159, 0, -21.715982563), x_dir=(-0.7592713073348843, 0, 0.6507742172658468), z_dir=(-0.6507742172658468, 0, -0.7592713073348843)).offset(CORTAR_EXTRUIR33_START), mode=Mode.PRIVATE) as cortar_extruir33_sk1:
        Polygon((36.562368097, 16.58771324), (33.812368097, 18.175426481), (31.062368097, 16.58771324), (31.062368097, 13.41228676), (33.812368097, 11.824573519), (36.562368097, 13.41228676), align=None)
    cortar_extruir33_tool1 = extrude(cortar_extruir33_sk1.sketch, amount=-CORTAR_EXTRUIR33_REACH, mode=Mode.PRIVATE) & body_2_1.part
    add(cortar_extruir33_tool1.solids().sort_by_distance((-42.658674, 15, 2.186413))[0], mode=Mode.SUBTRACT)

    # Croquis35 → Cortar-Extruir34 (cut, two sides)
    with BuildSketch(Plane(origin=(0, 20, 0), x_dir=(1, 0, 0), z_dir=(0, 1, 0))) as cortar_extruir34_sk:
        with Locations((17.04227466, -3.413432096)):
            Rectangle(CROQUIS35_W, CROQUIS35_H)
    extrude(amount=CORTAR_EXTRUIR34_DEPTH, mode=Mode.SUBTRACT)
    extrude(cortar_extruir34_sk.sketch, amount=-CORTAR_EXTRUIR34_DEPTH_BACK, mode=Mode.SUBTRACT)

    # Croquis36 → Cortar-Extruir35 (cut)
    with BuildSketch(Plane(origin=(20, 0, 0), x_dir=(0, 0, -1), z_dir=(1, 0, 0)).offset(CORTAR_EXTRUIR35_START)):
        Polygon((7.5, 16.58771324), (4.75, 18.175426481), (2, 16.58771324), (2, 13.41228676), (4.75, 11.824573519), (7.5, 13.41228676), align=None)
    extrude(amount=-CORTAR_EXTRUIR35_DEPTH, mode=Mode.SUBTRACT)

    # Croquis37 → Saliente-Extruir8 (add)
    with BuildSketch(Plane.XZ.offset(-10)):
        Polygon((-39.160527763, -4.104491148), (-20.614919368, -20), (-15, -20), (-19.558128305, -15.637570403), (-33.014002756, -4.104491148), align=None)
    extrude(amount=-SALIENTE_EXTRUIR8_DEPTH)

    # Croquis38 → Saliente-Extruir9 (add)
    with BuildSketch(Plane.XZ.offset(-10)):
        Polygon((-58.825, 12.75), (-38.825, 12.75), (-38.825, 9.75), (-55.324839942, 9.75), align=None)
    extrude(amount=SALIENTE_EXTRUIR9_DEPTH)

    # Croquis39 → Saliente-Extruir10 (add)
    with BuildSketch(Plane.XZ.offset(-10)):
        Polygon((-38.825, 9.75), (-38.825, 7.75), (-38.825, 5.75), (-50.657959865, 5.75), (-52.991399903, 7.75), (-55.324839942, 9.75), align=None)
    extrude(amount=SALIENTE_EXTRUIR10_DEPTH)

    # Simetría3: body 2 across face


with BuildPart() as body_2_2:
    add(body_2_1.part)
    add(body_2_1.part.mirror(Plane(origin=(-18.003999227, 20, -4.220503046), x_dir=(0, 0, 1), z_dir=(0, 1, 0))))

    # Croquis40 → Cortar-Extruir36 (cut, two sides)
    with BuildSketch(Plane(origin=(0, 0, -20), x_dir=(-1, 0, 0), z_dir=(0, 0, -1))) as cortar_extruir36_sk:
        with Locations((22.395502026, -3.695757982)):
            Rectangle(CROQUIS40_W, CROQUIS40_H)
    extrude(amount=CORTAR_EXTRUIR36_DEPTH, mode=Mode.SUBTRACT)
    extrude(cortar_extruir36_sk.sketch, amount=-CORTAR_EXTRUIR36_DEPTH_BACK, mode=Mode.SUBTRACT)

    # Croquis41 → Cortar-Extruir37 (cut, two sides)
    with BuildSketch(Plane.XZ.offset(-20)) as cortar_extruir37_sk:
        Polygon((-19.992980133, -22.302484261), (-20, 3.75), (-24, 7.75), (-56.035110209, 7.75), align=None)
    extrude(amount=CORTAR_EXTRUIR37_DEPTH, mode=Mode.SUBTRACT)
    extrude(cortar_extruir37_sk.sketch, amount=-CORTAR_EXTRUIR37_DEPTH_BACK, mode=Mode.SUBTRACT)

    # Croquis42 → Cortar-Extruir38 (cut, two sides)
    with BuildSketch(Plane(origin=(0, 0, 9.75), x_dir=(-1, 0, 0), z_dir=(0, 0, -1))) as cortar_extruir38_sk:
        Polygon((46.720301378, 20), (46.720301378, 30), (38.825, 30), (33.492952769, 43.760628779), (49.525340398, 48.951442806), (67.200390695, 42.512205152), (65.906601328, 20), (51.713995885, 13.864168239), align=None)
    extrude(amount=CORTAR_EXTRUIR38_DEPTH, mode=Mode.SUBTRACT)
    extrude(cortar_extruir38_sk.sketch, amount=-CORTAR_EXTRUIR38_DEPTH_BACK, mode=Mode.SUBTRACT)

    # Croquis43 → Saliente-Extruir11 (add)
    with BuildSketch(Plane.XZ.offset(-20)):
        Polygon((-19.993600539, -20), (-46.720301378, 7.75), (-43.839252857, 10.524807997), (-17.112552018, -17.225192003), align=None)
    extrude(amount=-SALIENTE_EXTRUIR11_DEPTH)

    # Croquis44 → Cortar-Extruir39 (cut, through all)
    with BuildSketch(Plane(origin=(0, 0, 9.75), x_dir=(-1, 0, 0), z_dir=(0, 0, -1))):
        Polygon((38.957161657, 27.75), (37.369448416, 25), (38.957161657, 22.25), (42.132588137, 22.25), (43.720301378, 25), (42.132588137, 27.75), align=None)
    extrude(amount=CORTAR_EXTRUIR39_DEPTH, mode=Mode.SUBTRACT)

    # Croquis45 → Saliente-Extruir12 (add)
    with BuildSketch(Plane.XY.offset(12.75)):
        with Locations((-30.985150689, 25)):
            Rectangle(CROQUIS45_W, CROQUIS45_H)
        with Locations((-40.544874897, 25)):
            Circle(CROQUIS45_R, mode=Mode.SUBTRACT)
        with Locations((-29, 25)):
            Circle(CROQUIS45_R, mode=Mode.SUBTRACT)
    extrude(amount=SALIENTE_EXTRUIR12_DEPTH)

    # Croquis46 → Saliente-Extruir13 (add)
    with BuildSketch(Plane.XZ.offset(-20)):
        with BuildLine():
            Line((15.25, 0), (20, 0))
            Line((20, 0), (20, 15.25))
            Line((20, 15.25), (7.549834435, 15.25))
            Line((7.549834435, 15.25), (7.549834435, 13.25))
            ThreePointArc((7.549834435, 13.25), (13.185171124, 7.662490615), (15.25, 0))
        make_face()
        with BuildLine():
            Line((-15.25, 0), (-15.25, 15.25))
            Line((-15.25, 15.25), (-7.549834435, 15.25))
            Line((-7.549834435, 15.25), (-7.549834435, 13.25))
            ThreePointArc((-7.549834435, 13.25), (-13.185171124, 7.662490615), (-15.25, 0))
        make_face()
    extrude(amount=-SALIENTE_EXTRUIR13_DEPTH)

    # Croquis47 → Cortar-Extruir40 (cut)
    with BuildSketch(Plane.XY.offset(15.25).offset(CORTAR_EXTRUIR40_START)):
        Polygon((15.41228676, 22.352505966), (17, 25.102505966), (15.41228676, 27.852505966), (12.236860279, 27.852505966), (10.649147039, 25.102505966), (12.236860279, 22.352505966), align=None)
        with Locations((13.824573519, 25.102505966)):
            Circle(CROQUIS47_R, mode=Mode.SUBTRACT)
        Polygon((-12.236860279, 22.352505966), (-15.41228676, 22.352505966), (-17, 25.102505966), (-15.41228676, 27.852505966), (-12.236860279, 27.852505966), (-10.649147039, 25.102505966), align=None)
        with Locations(Location((-13.824573519, 25.102505966, 0), (0, 0, 131.421584744))):
            Circle(CROQUIS47_R, mode=Mode.SUBTRACT)
    extrude(amount=-CORTAR_EXTRUIR40_DEPTH, mode=Mode.SUBTRACT)

    # Croquis48 → Cortar-Extruir41 (cut)
    with BuildSketch(Plane.XY.offset(15.25).offset(CORTAR_EXTRUIR41_START)):
        with Locations((13.824573519, 25.102505966)):
            Circle(CROQUIS48_R)
        with Locations((-13.824573519, 25.102505966)):
            Circle(CROQUIS48_R)
    extrude(amount=CORTAR_EXTRUIR41_DEPTH, mode=Mode.SUBTRACT)

    # Croquis49 → Cortar-Extruir42 (cut)
    with BuildSketch(Plane(origin=(0, 30, 0), x_dir=(1, 0, 0), z_dir=(0, 1, 0))):
        Polygon((-12.979274058, 11.5), (-10.958548116, 15), (-12.979274058, 18.5), (-17.020725942, 18.5), (-19.041451884, 15), (-17.020725942, 11.5), align=None)
        Polygon((17.020725942, 11.5), (19.041451884, 15), (17.020725942, 18.5), (12.979274058, 18.5), (10.958548116, 15), (12.979274058, 11.5), align=None)
    extrude(amount=-CORTAR_EXTRUIR42_DEPTH, mode=Mode.SUBTRACT)

    # Croquis50 → Cortar-Extruir43 (cut, two sides)
    with BuildSketch(Plane(origin=(0, 30, 0), x_dir=(1, 0, 0), z_dir=(0, 1, 0))) as cortar_extruir43_sk:
        with Locations(Location((-15, 15, 0), (0, 0, 270))):
            Circle(CROQUIS50_R)
        with Locations(Location((15, 15, 0), (0, 0, 270))):
            Circle(CROQUIS50_R)
    extrude(amount=CORTAR_EXTRUIR43_DEPTH, mode=Mode.SUBTRACT)
    extrude(cortar_extruir43_sk.sketch, amount=-CORTAR_EXTRUIR43_DEPTH_BACK, mode=Mode.SUBTRACT)

    # Croquis51 → Cortar-Extruir44 (cut, two sides)
    with BuildSketch(Plane(origin=(0, 30, 0), x_dir=(1, 0, 0), z_dir=(0, 1, 0))) as cortar_extruir44_sk:
        Polygon((-35.175426481, -15.25), (-35.175426481, -7.75), (-19.995154673, 14.232221634), (-19.993600539, 20), (-53.730413568, 5.241110817), (-52.418444784, -16.738442517), align=None)
    extrude(amount=CORTAR_EXTRUIR44_DEPTH, mode=Mode.SUBTRACT)
    extrude(cortar_extruir44_sk.sketch, amount=-CORTAR_EXTRUIR44_DEPTH_BACK, mode=Mode.SUBTRACT)

    # Croquis52 → Saliente-Extruir14 (add)
    with BuildSketch(Plane(origin=(0, 30, 0), x_dir=(1, 0, 0), z_dir=(0, 1, 0))):
        Polygon((-35.175426481, -7.75), (-19.993600539, 20), (-20, -3.75), (-24, -7.75), align=None)
    extrude(amount=-SALIENTE_EXTRUIR14_DEPTH)

    # Croquis54 → Cortar-Extruir45 (cut)
    with BuildSketch(Plane.XY.offset(15.25).offset(CORTAR_EXTRUIR45_START)):
        Polygon((-25.824573519, 25), (-27.41228676, 27.75), (-30.58771324, 27.75), (-32.175426481, 25), (-30.58771324, 22.25), (-27.41228676, 22.25), align=None)
    extrude(amount=CORTAR_EXTRUIR45_DEPTH, mode=Mode.SUBTRACT)


solid = body_2_2.part
